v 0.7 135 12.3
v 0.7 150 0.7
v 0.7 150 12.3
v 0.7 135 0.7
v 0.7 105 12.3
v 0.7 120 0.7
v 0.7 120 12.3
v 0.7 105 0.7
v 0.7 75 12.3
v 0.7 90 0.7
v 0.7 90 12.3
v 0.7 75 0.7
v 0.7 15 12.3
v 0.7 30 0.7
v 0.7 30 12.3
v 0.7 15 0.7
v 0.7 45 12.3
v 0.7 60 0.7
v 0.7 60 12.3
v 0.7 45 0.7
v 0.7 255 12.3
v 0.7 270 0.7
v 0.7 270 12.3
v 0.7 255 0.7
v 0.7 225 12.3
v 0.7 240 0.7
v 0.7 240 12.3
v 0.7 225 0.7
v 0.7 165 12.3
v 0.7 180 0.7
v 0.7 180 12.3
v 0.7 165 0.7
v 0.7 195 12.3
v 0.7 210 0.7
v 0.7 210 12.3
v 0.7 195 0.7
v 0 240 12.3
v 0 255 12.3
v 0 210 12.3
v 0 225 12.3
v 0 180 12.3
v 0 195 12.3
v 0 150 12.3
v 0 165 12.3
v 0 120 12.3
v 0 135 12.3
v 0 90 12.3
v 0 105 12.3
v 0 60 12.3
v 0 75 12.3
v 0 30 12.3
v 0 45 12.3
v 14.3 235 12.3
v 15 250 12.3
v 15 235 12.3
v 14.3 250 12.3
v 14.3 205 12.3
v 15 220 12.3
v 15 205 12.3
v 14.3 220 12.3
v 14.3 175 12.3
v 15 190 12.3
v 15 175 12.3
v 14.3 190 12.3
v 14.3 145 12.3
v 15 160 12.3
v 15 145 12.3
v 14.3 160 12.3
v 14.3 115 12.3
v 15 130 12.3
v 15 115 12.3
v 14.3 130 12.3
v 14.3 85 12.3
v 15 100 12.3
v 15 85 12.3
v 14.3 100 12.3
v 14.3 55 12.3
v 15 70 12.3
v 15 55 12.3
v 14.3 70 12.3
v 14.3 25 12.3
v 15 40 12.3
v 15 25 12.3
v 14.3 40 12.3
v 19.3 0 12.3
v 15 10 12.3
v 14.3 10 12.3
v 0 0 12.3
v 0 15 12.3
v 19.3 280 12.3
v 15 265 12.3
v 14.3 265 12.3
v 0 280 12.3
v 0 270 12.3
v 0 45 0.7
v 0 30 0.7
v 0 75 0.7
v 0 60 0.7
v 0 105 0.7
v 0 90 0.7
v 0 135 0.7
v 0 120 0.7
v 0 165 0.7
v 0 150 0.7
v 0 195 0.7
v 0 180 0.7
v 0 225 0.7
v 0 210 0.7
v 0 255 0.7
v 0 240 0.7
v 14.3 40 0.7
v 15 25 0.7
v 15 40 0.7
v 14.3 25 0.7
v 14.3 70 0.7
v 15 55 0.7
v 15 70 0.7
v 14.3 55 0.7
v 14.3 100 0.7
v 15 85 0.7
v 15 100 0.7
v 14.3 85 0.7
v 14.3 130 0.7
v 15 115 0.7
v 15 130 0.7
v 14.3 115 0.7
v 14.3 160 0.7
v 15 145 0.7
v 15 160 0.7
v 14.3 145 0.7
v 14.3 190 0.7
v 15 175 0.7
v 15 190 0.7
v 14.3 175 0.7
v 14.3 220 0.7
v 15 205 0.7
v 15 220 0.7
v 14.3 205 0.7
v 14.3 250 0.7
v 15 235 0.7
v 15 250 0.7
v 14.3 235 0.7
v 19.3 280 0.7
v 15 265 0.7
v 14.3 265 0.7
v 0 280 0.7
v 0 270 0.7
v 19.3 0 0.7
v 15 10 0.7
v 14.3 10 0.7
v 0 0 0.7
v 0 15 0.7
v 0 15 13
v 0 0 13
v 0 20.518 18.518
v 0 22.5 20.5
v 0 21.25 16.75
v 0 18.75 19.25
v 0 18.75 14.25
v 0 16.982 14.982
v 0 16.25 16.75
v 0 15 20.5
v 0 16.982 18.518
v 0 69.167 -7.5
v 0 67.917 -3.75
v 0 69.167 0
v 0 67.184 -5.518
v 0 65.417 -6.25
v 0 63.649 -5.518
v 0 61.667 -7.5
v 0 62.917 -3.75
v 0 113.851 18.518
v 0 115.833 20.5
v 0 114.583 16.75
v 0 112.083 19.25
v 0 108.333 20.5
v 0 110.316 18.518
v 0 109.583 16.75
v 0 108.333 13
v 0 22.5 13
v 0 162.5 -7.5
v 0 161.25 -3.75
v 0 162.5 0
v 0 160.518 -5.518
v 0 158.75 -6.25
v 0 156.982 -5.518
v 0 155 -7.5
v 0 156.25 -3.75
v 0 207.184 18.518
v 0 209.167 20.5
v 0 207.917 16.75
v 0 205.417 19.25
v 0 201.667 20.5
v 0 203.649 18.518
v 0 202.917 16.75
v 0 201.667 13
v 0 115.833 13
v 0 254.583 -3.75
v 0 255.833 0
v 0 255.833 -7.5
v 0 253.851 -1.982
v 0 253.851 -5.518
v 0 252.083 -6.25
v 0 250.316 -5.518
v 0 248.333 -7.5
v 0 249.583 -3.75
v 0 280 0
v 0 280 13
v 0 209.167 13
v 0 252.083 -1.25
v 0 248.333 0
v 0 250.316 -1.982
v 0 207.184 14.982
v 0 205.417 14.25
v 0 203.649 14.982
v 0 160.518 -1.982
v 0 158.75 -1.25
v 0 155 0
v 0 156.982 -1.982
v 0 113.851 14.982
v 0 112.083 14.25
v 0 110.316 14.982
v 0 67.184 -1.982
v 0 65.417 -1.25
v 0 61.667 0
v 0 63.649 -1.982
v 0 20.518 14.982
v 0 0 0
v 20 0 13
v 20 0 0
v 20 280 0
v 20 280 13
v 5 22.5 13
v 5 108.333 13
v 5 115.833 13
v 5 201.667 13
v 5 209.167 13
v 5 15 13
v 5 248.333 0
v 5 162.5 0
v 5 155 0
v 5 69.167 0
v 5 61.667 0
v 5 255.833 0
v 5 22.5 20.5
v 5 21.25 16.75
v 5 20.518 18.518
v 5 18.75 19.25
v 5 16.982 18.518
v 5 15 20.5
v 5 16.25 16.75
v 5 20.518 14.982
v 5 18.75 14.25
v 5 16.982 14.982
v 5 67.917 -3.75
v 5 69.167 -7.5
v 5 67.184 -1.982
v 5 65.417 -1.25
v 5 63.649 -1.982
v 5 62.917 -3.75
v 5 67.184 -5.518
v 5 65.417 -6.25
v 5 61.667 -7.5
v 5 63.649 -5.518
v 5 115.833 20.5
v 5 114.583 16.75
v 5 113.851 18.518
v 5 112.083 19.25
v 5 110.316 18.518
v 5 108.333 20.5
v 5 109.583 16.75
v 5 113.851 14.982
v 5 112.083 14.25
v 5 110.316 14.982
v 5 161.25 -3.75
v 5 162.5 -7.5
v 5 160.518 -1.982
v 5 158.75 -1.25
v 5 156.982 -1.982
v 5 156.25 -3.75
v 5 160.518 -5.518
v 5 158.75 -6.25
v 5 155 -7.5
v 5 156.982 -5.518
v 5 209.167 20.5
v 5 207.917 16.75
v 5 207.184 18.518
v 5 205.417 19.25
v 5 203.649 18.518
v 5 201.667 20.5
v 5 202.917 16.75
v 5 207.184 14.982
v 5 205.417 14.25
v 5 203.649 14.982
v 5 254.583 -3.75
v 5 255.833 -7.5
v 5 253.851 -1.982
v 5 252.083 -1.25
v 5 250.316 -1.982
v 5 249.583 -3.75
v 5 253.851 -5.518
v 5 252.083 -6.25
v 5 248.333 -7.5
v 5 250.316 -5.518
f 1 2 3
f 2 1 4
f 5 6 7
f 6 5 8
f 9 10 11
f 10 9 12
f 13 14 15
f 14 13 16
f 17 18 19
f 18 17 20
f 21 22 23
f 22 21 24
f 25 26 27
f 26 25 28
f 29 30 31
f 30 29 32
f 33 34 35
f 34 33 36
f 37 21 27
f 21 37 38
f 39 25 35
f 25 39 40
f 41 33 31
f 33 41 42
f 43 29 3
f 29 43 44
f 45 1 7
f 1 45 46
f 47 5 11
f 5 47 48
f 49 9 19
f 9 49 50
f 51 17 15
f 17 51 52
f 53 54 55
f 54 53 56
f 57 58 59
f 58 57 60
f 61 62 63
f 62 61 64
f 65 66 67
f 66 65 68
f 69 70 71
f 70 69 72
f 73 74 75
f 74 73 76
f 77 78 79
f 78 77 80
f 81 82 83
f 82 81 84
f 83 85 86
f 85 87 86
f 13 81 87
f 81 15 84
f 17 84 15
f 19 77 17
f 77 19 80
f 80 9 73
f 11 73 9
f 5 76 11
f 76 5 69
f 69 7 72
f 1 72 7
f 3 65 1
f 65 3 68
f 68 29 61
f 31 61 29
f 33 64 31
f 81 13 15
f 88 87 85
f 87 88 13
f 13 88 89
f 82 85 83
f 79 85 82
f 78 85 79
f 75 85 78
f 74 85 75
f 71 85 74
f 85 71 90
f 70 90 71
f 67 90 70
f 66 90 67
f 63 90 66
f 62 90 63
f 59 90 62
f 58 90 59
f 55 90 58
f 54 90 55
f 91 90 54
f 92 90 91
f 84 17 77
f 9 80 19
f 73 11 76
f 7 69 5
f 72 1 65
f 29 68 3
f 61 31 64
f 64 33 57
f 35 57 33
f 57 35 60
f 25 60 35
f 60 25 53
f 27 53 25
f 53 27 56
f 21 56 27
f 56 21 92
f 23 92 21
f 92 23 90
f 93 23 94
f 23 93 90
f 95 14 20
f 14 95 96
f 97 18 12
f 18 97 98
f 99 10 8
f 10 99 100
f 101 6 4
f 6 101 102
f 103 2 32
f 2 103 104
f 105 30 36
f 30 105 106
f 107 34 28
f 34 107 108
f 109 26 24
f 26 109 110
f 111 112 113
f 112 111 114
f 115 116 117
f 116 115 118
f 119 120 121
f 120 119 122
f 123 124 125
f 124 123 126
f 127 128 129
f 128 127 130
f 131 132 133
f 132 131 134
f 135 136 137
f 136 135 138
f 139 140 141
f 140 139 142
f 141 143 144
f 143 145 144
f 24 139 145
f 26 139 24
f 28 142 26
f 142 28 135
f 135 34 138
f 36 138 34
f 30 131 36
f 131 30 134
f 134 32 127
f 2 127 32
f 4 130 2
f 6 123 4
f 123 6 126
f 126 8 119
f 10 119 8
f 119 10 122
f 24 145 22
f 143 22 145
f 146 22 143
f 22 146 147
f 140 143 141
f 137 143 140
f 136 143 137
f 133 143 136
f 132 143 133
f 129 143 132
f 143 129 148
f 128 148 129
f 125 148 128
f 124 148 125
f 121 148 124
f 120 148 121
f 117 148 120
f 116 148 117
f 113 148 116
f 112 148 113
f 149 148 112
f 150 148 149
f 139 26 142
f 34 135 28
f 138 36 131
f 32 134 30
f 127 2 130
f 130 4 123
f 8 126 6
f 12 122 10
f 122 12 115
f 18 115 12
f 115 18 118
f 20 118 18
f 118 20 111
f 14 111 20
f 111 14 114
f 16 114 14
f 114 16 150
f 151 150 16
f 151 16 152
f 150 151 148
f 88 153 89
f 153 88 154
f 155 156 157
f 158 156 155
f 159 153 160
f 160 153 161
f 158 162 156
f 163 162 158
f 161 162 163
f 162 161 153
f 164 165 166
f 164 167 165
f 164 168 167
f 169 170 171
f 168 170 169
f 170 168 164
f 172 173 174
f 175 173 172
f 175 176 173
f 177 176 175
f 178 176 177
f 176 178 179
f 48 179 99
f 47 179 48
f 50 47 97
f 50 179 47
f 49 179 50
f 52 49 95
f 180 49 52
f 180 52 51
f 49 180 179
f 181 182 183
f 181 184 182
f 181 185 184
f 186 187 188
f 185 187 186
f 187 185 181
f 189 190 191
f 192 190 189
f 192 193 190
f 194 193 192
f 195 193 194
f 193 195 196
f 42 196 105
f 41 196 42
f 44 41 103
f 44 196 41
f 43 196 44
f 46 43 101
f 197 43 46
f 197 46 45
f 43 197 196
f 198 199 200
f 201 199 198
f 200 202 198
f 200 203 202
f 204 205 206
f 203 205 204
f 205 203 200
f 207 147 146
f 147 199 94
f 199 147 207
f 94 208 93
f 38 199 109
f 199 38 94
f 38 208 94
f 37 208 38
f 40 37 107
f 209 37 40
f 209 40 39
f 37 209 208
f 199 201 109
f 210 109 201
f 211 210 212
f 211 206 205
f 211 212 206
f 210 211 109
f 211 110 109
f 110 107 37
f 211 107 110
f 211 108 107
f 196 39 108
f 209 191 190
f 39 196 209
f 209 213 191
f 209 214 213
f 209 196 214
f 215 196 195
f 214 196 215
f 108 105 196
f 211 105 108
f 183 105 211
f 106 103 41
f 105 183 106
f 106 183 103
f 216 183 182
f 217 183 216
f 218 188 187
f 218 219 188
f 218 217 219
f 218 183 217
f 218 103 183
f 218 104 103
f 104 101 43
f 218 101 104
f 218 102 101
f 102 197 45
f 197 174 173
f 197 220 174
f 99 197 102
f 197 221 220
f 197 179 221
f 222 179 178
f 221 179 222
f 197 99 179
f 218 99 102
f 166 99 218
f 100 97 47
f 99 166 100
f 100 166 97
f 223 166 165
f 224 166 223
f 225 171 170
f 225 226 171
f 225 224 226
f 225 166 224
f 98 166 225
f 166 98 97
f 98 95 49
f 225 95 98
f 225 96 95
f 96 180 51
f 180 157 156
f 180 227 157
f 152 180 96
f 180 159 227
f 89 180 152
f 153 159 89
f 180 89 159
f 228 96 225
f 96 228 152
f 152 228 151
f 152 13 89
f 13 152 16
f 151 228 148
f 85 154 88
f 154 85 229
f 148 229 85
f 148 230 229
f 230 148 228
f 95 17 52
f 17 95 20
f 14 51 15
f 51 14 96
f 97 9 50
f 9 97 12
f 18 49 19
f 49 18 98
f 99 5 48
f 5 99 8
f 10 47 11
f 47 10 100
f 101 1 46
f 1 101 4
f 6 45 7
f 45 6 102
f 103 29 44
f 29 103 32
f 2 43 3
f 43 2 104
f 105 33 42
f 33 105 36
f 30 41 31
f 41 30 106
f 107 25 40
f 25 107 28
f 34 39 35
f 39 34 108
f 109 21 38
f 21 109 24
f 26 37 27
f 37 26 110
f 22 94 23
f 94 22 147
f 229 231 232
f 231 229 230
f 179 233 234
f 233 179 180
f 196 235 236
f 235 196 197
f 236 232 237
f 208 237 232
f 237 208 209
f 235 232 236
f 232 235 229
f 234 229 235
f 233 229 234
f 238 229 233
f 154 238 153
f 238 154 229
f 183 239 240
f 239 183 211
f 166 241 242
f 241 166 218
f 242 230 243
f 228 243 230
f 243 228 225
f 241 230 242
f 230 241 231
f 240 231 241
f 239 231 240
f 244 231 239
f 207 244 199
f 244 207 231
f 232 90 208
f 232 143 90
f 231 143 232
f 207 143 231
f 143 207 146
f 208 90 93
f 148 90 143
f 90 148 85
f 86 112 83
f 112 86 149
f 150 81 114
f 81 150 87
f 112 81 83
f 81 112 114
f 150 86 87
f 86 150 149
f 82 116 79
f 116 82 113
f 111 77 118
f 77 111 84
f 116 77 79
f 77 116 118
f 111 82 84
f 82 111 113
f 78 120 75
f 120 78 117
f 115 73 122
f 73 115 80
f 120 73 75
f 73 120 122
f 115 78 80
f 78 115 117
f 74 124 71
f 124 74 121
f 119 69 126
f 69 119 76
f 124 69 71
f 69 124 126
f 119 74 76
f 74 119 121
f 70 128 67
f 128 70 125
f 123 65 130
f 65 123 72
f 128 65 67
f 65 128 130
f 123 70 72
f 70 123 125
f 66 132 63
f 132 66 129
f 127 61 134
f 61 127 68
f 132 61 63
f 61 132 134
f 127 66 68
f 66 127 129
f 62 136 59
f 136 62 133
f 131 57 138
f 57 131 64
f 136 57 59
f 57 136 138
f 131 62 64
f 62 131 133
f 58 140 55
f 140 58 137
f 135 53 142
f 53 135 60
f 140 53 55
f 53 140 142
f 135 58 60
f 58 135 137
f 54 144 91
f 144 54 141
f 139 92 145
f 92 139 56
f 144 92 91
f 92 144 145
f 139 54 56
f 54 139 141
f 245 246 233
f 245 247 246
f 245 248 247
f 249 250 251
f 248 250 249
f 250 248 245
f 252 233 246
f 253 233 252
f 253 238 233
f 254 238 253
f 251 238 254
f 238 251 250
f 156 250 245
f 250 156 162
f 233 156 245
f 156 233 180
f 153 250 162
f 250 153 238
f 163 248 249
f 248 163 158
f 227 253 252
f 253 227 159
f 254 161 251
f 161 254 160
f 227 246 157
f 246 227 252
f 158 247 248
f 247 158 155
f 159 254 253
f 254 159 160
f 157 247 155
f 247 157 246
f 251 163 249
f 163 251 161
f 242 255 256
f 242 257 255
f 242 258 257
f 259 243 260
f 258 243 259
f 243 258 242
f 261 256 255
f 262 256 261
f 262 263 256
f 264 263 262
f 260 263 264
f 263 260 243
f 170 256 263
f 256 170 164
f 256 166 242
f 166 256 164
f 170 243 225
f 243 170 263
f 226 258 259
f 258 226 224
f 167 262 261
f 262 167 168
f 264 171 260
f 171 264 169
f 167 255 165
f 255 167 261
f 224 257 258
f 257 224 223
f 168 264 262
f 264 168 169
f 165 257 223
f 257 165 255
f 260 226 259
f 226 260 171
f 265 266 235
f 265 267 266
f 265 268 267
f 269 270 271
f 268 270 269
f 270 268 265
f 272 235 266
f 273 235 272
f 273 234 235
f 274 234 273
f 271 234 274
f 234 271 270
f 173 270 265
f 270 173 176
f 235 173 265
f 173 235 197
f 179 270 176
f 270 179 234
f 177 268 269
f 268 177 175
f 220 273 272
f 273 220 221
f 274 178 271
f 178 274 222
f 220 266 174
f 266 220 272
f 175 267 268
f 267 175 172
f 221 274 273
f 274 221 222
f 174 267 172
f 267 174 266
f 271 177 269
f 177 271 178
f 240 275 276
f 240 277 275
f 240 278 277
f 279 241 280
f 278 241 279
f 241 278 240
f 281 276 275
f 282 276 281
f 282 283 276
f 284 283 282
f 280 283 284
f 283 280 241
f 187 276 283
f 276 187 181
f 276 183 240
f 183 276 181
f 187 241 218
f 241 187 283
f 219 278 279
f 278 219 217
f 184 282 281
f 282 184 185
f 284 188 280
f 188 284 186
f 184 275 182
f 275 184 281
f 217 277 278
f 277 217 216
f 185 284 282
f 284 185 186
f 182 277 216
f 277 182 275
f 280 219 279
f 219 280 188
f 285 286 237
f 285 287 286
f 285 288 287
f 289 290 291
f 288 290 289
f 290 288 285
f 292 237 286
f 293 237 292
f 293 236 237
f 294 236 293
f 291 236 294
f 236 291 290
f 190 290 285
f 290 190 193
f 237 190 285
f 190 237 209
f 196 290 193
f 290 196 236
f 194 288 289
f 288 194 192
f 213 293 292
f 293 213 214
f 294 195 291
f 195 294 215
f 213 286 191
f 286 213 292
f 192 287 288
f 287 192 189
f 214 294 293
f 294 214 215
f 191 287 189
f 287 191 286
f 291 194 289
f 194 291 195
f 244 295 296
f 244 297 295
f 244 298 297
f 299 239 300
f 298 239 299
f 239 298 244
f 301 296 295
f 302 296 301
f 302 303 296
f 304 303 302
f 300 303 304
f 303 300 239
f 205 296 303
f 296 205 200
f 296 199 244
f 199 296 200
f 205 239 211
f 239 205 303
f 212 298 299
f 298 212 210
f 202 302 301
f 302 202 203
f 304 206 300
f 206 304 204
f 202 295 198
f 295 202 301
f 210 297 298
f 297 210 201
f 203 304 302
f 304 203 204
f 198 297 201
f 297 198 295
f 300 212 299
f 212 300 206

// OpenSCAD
module frame() {
t = 2;
h = 40;
l = 250;
w = 20;

difference() {
cube(size=[w,l,h]);
translate([0,0,t]) cube(size=[w-1.5*t,l,h-2*t]);
}
}

module strip_holder() {
	t = 0.7;
	h = 13;
	l = 280;
	w = 20;
	tab_l = 15;
	screw_holder_r = 2.5;
	screw_holder_l = 3*screw_holder_r;
	screw_holder_t = 5;

	difference() {
		cube(size=[w,l,h]);
		translate([t,0,t]) cube(size=[w-2*t,l,h-2*t]);
		// outer tabs that hold wires
		for(y = [0:2*tab_l:l]){
			translate([0,y,t]) cube(size=[t,tab_l,h-2*t]);
		}
	}
	// Inner tabs that hold strip
	for(y = [10:2*tab_l:l-tab_l]){
		translate([w-t-5,y,t]) cube(size=[t,tab_l,h-2*t]);
	}
	
	// Screw holes
	for(y = [15:l/3:l-screw_holder_l]){
		translate([0,y,h])
			difference(){
				cube(size=[screw_holder_t,screw_holder_l,screw_holder_l]);
				translate([0,screw_holder_l/2,screw_holder_l/2])
					rotate(a=[0,90,0])	cylinder(r=screw_holder_l/3, h=screw_holder_t);
			}
		translate([0,y+l/6,-screw_holder_l])
			difference(){
				cube(size=[screw_holder_t,screw_holder_l,screw_holder_l]);
				translate([0,screw_holder_l/2,screw_holder_l/2])
					rotate(a=[0,90,0])	cylinder(r=screw_holder_l/3, h=screw_holder_t);
			}
		
	}
}

strip_holder();
